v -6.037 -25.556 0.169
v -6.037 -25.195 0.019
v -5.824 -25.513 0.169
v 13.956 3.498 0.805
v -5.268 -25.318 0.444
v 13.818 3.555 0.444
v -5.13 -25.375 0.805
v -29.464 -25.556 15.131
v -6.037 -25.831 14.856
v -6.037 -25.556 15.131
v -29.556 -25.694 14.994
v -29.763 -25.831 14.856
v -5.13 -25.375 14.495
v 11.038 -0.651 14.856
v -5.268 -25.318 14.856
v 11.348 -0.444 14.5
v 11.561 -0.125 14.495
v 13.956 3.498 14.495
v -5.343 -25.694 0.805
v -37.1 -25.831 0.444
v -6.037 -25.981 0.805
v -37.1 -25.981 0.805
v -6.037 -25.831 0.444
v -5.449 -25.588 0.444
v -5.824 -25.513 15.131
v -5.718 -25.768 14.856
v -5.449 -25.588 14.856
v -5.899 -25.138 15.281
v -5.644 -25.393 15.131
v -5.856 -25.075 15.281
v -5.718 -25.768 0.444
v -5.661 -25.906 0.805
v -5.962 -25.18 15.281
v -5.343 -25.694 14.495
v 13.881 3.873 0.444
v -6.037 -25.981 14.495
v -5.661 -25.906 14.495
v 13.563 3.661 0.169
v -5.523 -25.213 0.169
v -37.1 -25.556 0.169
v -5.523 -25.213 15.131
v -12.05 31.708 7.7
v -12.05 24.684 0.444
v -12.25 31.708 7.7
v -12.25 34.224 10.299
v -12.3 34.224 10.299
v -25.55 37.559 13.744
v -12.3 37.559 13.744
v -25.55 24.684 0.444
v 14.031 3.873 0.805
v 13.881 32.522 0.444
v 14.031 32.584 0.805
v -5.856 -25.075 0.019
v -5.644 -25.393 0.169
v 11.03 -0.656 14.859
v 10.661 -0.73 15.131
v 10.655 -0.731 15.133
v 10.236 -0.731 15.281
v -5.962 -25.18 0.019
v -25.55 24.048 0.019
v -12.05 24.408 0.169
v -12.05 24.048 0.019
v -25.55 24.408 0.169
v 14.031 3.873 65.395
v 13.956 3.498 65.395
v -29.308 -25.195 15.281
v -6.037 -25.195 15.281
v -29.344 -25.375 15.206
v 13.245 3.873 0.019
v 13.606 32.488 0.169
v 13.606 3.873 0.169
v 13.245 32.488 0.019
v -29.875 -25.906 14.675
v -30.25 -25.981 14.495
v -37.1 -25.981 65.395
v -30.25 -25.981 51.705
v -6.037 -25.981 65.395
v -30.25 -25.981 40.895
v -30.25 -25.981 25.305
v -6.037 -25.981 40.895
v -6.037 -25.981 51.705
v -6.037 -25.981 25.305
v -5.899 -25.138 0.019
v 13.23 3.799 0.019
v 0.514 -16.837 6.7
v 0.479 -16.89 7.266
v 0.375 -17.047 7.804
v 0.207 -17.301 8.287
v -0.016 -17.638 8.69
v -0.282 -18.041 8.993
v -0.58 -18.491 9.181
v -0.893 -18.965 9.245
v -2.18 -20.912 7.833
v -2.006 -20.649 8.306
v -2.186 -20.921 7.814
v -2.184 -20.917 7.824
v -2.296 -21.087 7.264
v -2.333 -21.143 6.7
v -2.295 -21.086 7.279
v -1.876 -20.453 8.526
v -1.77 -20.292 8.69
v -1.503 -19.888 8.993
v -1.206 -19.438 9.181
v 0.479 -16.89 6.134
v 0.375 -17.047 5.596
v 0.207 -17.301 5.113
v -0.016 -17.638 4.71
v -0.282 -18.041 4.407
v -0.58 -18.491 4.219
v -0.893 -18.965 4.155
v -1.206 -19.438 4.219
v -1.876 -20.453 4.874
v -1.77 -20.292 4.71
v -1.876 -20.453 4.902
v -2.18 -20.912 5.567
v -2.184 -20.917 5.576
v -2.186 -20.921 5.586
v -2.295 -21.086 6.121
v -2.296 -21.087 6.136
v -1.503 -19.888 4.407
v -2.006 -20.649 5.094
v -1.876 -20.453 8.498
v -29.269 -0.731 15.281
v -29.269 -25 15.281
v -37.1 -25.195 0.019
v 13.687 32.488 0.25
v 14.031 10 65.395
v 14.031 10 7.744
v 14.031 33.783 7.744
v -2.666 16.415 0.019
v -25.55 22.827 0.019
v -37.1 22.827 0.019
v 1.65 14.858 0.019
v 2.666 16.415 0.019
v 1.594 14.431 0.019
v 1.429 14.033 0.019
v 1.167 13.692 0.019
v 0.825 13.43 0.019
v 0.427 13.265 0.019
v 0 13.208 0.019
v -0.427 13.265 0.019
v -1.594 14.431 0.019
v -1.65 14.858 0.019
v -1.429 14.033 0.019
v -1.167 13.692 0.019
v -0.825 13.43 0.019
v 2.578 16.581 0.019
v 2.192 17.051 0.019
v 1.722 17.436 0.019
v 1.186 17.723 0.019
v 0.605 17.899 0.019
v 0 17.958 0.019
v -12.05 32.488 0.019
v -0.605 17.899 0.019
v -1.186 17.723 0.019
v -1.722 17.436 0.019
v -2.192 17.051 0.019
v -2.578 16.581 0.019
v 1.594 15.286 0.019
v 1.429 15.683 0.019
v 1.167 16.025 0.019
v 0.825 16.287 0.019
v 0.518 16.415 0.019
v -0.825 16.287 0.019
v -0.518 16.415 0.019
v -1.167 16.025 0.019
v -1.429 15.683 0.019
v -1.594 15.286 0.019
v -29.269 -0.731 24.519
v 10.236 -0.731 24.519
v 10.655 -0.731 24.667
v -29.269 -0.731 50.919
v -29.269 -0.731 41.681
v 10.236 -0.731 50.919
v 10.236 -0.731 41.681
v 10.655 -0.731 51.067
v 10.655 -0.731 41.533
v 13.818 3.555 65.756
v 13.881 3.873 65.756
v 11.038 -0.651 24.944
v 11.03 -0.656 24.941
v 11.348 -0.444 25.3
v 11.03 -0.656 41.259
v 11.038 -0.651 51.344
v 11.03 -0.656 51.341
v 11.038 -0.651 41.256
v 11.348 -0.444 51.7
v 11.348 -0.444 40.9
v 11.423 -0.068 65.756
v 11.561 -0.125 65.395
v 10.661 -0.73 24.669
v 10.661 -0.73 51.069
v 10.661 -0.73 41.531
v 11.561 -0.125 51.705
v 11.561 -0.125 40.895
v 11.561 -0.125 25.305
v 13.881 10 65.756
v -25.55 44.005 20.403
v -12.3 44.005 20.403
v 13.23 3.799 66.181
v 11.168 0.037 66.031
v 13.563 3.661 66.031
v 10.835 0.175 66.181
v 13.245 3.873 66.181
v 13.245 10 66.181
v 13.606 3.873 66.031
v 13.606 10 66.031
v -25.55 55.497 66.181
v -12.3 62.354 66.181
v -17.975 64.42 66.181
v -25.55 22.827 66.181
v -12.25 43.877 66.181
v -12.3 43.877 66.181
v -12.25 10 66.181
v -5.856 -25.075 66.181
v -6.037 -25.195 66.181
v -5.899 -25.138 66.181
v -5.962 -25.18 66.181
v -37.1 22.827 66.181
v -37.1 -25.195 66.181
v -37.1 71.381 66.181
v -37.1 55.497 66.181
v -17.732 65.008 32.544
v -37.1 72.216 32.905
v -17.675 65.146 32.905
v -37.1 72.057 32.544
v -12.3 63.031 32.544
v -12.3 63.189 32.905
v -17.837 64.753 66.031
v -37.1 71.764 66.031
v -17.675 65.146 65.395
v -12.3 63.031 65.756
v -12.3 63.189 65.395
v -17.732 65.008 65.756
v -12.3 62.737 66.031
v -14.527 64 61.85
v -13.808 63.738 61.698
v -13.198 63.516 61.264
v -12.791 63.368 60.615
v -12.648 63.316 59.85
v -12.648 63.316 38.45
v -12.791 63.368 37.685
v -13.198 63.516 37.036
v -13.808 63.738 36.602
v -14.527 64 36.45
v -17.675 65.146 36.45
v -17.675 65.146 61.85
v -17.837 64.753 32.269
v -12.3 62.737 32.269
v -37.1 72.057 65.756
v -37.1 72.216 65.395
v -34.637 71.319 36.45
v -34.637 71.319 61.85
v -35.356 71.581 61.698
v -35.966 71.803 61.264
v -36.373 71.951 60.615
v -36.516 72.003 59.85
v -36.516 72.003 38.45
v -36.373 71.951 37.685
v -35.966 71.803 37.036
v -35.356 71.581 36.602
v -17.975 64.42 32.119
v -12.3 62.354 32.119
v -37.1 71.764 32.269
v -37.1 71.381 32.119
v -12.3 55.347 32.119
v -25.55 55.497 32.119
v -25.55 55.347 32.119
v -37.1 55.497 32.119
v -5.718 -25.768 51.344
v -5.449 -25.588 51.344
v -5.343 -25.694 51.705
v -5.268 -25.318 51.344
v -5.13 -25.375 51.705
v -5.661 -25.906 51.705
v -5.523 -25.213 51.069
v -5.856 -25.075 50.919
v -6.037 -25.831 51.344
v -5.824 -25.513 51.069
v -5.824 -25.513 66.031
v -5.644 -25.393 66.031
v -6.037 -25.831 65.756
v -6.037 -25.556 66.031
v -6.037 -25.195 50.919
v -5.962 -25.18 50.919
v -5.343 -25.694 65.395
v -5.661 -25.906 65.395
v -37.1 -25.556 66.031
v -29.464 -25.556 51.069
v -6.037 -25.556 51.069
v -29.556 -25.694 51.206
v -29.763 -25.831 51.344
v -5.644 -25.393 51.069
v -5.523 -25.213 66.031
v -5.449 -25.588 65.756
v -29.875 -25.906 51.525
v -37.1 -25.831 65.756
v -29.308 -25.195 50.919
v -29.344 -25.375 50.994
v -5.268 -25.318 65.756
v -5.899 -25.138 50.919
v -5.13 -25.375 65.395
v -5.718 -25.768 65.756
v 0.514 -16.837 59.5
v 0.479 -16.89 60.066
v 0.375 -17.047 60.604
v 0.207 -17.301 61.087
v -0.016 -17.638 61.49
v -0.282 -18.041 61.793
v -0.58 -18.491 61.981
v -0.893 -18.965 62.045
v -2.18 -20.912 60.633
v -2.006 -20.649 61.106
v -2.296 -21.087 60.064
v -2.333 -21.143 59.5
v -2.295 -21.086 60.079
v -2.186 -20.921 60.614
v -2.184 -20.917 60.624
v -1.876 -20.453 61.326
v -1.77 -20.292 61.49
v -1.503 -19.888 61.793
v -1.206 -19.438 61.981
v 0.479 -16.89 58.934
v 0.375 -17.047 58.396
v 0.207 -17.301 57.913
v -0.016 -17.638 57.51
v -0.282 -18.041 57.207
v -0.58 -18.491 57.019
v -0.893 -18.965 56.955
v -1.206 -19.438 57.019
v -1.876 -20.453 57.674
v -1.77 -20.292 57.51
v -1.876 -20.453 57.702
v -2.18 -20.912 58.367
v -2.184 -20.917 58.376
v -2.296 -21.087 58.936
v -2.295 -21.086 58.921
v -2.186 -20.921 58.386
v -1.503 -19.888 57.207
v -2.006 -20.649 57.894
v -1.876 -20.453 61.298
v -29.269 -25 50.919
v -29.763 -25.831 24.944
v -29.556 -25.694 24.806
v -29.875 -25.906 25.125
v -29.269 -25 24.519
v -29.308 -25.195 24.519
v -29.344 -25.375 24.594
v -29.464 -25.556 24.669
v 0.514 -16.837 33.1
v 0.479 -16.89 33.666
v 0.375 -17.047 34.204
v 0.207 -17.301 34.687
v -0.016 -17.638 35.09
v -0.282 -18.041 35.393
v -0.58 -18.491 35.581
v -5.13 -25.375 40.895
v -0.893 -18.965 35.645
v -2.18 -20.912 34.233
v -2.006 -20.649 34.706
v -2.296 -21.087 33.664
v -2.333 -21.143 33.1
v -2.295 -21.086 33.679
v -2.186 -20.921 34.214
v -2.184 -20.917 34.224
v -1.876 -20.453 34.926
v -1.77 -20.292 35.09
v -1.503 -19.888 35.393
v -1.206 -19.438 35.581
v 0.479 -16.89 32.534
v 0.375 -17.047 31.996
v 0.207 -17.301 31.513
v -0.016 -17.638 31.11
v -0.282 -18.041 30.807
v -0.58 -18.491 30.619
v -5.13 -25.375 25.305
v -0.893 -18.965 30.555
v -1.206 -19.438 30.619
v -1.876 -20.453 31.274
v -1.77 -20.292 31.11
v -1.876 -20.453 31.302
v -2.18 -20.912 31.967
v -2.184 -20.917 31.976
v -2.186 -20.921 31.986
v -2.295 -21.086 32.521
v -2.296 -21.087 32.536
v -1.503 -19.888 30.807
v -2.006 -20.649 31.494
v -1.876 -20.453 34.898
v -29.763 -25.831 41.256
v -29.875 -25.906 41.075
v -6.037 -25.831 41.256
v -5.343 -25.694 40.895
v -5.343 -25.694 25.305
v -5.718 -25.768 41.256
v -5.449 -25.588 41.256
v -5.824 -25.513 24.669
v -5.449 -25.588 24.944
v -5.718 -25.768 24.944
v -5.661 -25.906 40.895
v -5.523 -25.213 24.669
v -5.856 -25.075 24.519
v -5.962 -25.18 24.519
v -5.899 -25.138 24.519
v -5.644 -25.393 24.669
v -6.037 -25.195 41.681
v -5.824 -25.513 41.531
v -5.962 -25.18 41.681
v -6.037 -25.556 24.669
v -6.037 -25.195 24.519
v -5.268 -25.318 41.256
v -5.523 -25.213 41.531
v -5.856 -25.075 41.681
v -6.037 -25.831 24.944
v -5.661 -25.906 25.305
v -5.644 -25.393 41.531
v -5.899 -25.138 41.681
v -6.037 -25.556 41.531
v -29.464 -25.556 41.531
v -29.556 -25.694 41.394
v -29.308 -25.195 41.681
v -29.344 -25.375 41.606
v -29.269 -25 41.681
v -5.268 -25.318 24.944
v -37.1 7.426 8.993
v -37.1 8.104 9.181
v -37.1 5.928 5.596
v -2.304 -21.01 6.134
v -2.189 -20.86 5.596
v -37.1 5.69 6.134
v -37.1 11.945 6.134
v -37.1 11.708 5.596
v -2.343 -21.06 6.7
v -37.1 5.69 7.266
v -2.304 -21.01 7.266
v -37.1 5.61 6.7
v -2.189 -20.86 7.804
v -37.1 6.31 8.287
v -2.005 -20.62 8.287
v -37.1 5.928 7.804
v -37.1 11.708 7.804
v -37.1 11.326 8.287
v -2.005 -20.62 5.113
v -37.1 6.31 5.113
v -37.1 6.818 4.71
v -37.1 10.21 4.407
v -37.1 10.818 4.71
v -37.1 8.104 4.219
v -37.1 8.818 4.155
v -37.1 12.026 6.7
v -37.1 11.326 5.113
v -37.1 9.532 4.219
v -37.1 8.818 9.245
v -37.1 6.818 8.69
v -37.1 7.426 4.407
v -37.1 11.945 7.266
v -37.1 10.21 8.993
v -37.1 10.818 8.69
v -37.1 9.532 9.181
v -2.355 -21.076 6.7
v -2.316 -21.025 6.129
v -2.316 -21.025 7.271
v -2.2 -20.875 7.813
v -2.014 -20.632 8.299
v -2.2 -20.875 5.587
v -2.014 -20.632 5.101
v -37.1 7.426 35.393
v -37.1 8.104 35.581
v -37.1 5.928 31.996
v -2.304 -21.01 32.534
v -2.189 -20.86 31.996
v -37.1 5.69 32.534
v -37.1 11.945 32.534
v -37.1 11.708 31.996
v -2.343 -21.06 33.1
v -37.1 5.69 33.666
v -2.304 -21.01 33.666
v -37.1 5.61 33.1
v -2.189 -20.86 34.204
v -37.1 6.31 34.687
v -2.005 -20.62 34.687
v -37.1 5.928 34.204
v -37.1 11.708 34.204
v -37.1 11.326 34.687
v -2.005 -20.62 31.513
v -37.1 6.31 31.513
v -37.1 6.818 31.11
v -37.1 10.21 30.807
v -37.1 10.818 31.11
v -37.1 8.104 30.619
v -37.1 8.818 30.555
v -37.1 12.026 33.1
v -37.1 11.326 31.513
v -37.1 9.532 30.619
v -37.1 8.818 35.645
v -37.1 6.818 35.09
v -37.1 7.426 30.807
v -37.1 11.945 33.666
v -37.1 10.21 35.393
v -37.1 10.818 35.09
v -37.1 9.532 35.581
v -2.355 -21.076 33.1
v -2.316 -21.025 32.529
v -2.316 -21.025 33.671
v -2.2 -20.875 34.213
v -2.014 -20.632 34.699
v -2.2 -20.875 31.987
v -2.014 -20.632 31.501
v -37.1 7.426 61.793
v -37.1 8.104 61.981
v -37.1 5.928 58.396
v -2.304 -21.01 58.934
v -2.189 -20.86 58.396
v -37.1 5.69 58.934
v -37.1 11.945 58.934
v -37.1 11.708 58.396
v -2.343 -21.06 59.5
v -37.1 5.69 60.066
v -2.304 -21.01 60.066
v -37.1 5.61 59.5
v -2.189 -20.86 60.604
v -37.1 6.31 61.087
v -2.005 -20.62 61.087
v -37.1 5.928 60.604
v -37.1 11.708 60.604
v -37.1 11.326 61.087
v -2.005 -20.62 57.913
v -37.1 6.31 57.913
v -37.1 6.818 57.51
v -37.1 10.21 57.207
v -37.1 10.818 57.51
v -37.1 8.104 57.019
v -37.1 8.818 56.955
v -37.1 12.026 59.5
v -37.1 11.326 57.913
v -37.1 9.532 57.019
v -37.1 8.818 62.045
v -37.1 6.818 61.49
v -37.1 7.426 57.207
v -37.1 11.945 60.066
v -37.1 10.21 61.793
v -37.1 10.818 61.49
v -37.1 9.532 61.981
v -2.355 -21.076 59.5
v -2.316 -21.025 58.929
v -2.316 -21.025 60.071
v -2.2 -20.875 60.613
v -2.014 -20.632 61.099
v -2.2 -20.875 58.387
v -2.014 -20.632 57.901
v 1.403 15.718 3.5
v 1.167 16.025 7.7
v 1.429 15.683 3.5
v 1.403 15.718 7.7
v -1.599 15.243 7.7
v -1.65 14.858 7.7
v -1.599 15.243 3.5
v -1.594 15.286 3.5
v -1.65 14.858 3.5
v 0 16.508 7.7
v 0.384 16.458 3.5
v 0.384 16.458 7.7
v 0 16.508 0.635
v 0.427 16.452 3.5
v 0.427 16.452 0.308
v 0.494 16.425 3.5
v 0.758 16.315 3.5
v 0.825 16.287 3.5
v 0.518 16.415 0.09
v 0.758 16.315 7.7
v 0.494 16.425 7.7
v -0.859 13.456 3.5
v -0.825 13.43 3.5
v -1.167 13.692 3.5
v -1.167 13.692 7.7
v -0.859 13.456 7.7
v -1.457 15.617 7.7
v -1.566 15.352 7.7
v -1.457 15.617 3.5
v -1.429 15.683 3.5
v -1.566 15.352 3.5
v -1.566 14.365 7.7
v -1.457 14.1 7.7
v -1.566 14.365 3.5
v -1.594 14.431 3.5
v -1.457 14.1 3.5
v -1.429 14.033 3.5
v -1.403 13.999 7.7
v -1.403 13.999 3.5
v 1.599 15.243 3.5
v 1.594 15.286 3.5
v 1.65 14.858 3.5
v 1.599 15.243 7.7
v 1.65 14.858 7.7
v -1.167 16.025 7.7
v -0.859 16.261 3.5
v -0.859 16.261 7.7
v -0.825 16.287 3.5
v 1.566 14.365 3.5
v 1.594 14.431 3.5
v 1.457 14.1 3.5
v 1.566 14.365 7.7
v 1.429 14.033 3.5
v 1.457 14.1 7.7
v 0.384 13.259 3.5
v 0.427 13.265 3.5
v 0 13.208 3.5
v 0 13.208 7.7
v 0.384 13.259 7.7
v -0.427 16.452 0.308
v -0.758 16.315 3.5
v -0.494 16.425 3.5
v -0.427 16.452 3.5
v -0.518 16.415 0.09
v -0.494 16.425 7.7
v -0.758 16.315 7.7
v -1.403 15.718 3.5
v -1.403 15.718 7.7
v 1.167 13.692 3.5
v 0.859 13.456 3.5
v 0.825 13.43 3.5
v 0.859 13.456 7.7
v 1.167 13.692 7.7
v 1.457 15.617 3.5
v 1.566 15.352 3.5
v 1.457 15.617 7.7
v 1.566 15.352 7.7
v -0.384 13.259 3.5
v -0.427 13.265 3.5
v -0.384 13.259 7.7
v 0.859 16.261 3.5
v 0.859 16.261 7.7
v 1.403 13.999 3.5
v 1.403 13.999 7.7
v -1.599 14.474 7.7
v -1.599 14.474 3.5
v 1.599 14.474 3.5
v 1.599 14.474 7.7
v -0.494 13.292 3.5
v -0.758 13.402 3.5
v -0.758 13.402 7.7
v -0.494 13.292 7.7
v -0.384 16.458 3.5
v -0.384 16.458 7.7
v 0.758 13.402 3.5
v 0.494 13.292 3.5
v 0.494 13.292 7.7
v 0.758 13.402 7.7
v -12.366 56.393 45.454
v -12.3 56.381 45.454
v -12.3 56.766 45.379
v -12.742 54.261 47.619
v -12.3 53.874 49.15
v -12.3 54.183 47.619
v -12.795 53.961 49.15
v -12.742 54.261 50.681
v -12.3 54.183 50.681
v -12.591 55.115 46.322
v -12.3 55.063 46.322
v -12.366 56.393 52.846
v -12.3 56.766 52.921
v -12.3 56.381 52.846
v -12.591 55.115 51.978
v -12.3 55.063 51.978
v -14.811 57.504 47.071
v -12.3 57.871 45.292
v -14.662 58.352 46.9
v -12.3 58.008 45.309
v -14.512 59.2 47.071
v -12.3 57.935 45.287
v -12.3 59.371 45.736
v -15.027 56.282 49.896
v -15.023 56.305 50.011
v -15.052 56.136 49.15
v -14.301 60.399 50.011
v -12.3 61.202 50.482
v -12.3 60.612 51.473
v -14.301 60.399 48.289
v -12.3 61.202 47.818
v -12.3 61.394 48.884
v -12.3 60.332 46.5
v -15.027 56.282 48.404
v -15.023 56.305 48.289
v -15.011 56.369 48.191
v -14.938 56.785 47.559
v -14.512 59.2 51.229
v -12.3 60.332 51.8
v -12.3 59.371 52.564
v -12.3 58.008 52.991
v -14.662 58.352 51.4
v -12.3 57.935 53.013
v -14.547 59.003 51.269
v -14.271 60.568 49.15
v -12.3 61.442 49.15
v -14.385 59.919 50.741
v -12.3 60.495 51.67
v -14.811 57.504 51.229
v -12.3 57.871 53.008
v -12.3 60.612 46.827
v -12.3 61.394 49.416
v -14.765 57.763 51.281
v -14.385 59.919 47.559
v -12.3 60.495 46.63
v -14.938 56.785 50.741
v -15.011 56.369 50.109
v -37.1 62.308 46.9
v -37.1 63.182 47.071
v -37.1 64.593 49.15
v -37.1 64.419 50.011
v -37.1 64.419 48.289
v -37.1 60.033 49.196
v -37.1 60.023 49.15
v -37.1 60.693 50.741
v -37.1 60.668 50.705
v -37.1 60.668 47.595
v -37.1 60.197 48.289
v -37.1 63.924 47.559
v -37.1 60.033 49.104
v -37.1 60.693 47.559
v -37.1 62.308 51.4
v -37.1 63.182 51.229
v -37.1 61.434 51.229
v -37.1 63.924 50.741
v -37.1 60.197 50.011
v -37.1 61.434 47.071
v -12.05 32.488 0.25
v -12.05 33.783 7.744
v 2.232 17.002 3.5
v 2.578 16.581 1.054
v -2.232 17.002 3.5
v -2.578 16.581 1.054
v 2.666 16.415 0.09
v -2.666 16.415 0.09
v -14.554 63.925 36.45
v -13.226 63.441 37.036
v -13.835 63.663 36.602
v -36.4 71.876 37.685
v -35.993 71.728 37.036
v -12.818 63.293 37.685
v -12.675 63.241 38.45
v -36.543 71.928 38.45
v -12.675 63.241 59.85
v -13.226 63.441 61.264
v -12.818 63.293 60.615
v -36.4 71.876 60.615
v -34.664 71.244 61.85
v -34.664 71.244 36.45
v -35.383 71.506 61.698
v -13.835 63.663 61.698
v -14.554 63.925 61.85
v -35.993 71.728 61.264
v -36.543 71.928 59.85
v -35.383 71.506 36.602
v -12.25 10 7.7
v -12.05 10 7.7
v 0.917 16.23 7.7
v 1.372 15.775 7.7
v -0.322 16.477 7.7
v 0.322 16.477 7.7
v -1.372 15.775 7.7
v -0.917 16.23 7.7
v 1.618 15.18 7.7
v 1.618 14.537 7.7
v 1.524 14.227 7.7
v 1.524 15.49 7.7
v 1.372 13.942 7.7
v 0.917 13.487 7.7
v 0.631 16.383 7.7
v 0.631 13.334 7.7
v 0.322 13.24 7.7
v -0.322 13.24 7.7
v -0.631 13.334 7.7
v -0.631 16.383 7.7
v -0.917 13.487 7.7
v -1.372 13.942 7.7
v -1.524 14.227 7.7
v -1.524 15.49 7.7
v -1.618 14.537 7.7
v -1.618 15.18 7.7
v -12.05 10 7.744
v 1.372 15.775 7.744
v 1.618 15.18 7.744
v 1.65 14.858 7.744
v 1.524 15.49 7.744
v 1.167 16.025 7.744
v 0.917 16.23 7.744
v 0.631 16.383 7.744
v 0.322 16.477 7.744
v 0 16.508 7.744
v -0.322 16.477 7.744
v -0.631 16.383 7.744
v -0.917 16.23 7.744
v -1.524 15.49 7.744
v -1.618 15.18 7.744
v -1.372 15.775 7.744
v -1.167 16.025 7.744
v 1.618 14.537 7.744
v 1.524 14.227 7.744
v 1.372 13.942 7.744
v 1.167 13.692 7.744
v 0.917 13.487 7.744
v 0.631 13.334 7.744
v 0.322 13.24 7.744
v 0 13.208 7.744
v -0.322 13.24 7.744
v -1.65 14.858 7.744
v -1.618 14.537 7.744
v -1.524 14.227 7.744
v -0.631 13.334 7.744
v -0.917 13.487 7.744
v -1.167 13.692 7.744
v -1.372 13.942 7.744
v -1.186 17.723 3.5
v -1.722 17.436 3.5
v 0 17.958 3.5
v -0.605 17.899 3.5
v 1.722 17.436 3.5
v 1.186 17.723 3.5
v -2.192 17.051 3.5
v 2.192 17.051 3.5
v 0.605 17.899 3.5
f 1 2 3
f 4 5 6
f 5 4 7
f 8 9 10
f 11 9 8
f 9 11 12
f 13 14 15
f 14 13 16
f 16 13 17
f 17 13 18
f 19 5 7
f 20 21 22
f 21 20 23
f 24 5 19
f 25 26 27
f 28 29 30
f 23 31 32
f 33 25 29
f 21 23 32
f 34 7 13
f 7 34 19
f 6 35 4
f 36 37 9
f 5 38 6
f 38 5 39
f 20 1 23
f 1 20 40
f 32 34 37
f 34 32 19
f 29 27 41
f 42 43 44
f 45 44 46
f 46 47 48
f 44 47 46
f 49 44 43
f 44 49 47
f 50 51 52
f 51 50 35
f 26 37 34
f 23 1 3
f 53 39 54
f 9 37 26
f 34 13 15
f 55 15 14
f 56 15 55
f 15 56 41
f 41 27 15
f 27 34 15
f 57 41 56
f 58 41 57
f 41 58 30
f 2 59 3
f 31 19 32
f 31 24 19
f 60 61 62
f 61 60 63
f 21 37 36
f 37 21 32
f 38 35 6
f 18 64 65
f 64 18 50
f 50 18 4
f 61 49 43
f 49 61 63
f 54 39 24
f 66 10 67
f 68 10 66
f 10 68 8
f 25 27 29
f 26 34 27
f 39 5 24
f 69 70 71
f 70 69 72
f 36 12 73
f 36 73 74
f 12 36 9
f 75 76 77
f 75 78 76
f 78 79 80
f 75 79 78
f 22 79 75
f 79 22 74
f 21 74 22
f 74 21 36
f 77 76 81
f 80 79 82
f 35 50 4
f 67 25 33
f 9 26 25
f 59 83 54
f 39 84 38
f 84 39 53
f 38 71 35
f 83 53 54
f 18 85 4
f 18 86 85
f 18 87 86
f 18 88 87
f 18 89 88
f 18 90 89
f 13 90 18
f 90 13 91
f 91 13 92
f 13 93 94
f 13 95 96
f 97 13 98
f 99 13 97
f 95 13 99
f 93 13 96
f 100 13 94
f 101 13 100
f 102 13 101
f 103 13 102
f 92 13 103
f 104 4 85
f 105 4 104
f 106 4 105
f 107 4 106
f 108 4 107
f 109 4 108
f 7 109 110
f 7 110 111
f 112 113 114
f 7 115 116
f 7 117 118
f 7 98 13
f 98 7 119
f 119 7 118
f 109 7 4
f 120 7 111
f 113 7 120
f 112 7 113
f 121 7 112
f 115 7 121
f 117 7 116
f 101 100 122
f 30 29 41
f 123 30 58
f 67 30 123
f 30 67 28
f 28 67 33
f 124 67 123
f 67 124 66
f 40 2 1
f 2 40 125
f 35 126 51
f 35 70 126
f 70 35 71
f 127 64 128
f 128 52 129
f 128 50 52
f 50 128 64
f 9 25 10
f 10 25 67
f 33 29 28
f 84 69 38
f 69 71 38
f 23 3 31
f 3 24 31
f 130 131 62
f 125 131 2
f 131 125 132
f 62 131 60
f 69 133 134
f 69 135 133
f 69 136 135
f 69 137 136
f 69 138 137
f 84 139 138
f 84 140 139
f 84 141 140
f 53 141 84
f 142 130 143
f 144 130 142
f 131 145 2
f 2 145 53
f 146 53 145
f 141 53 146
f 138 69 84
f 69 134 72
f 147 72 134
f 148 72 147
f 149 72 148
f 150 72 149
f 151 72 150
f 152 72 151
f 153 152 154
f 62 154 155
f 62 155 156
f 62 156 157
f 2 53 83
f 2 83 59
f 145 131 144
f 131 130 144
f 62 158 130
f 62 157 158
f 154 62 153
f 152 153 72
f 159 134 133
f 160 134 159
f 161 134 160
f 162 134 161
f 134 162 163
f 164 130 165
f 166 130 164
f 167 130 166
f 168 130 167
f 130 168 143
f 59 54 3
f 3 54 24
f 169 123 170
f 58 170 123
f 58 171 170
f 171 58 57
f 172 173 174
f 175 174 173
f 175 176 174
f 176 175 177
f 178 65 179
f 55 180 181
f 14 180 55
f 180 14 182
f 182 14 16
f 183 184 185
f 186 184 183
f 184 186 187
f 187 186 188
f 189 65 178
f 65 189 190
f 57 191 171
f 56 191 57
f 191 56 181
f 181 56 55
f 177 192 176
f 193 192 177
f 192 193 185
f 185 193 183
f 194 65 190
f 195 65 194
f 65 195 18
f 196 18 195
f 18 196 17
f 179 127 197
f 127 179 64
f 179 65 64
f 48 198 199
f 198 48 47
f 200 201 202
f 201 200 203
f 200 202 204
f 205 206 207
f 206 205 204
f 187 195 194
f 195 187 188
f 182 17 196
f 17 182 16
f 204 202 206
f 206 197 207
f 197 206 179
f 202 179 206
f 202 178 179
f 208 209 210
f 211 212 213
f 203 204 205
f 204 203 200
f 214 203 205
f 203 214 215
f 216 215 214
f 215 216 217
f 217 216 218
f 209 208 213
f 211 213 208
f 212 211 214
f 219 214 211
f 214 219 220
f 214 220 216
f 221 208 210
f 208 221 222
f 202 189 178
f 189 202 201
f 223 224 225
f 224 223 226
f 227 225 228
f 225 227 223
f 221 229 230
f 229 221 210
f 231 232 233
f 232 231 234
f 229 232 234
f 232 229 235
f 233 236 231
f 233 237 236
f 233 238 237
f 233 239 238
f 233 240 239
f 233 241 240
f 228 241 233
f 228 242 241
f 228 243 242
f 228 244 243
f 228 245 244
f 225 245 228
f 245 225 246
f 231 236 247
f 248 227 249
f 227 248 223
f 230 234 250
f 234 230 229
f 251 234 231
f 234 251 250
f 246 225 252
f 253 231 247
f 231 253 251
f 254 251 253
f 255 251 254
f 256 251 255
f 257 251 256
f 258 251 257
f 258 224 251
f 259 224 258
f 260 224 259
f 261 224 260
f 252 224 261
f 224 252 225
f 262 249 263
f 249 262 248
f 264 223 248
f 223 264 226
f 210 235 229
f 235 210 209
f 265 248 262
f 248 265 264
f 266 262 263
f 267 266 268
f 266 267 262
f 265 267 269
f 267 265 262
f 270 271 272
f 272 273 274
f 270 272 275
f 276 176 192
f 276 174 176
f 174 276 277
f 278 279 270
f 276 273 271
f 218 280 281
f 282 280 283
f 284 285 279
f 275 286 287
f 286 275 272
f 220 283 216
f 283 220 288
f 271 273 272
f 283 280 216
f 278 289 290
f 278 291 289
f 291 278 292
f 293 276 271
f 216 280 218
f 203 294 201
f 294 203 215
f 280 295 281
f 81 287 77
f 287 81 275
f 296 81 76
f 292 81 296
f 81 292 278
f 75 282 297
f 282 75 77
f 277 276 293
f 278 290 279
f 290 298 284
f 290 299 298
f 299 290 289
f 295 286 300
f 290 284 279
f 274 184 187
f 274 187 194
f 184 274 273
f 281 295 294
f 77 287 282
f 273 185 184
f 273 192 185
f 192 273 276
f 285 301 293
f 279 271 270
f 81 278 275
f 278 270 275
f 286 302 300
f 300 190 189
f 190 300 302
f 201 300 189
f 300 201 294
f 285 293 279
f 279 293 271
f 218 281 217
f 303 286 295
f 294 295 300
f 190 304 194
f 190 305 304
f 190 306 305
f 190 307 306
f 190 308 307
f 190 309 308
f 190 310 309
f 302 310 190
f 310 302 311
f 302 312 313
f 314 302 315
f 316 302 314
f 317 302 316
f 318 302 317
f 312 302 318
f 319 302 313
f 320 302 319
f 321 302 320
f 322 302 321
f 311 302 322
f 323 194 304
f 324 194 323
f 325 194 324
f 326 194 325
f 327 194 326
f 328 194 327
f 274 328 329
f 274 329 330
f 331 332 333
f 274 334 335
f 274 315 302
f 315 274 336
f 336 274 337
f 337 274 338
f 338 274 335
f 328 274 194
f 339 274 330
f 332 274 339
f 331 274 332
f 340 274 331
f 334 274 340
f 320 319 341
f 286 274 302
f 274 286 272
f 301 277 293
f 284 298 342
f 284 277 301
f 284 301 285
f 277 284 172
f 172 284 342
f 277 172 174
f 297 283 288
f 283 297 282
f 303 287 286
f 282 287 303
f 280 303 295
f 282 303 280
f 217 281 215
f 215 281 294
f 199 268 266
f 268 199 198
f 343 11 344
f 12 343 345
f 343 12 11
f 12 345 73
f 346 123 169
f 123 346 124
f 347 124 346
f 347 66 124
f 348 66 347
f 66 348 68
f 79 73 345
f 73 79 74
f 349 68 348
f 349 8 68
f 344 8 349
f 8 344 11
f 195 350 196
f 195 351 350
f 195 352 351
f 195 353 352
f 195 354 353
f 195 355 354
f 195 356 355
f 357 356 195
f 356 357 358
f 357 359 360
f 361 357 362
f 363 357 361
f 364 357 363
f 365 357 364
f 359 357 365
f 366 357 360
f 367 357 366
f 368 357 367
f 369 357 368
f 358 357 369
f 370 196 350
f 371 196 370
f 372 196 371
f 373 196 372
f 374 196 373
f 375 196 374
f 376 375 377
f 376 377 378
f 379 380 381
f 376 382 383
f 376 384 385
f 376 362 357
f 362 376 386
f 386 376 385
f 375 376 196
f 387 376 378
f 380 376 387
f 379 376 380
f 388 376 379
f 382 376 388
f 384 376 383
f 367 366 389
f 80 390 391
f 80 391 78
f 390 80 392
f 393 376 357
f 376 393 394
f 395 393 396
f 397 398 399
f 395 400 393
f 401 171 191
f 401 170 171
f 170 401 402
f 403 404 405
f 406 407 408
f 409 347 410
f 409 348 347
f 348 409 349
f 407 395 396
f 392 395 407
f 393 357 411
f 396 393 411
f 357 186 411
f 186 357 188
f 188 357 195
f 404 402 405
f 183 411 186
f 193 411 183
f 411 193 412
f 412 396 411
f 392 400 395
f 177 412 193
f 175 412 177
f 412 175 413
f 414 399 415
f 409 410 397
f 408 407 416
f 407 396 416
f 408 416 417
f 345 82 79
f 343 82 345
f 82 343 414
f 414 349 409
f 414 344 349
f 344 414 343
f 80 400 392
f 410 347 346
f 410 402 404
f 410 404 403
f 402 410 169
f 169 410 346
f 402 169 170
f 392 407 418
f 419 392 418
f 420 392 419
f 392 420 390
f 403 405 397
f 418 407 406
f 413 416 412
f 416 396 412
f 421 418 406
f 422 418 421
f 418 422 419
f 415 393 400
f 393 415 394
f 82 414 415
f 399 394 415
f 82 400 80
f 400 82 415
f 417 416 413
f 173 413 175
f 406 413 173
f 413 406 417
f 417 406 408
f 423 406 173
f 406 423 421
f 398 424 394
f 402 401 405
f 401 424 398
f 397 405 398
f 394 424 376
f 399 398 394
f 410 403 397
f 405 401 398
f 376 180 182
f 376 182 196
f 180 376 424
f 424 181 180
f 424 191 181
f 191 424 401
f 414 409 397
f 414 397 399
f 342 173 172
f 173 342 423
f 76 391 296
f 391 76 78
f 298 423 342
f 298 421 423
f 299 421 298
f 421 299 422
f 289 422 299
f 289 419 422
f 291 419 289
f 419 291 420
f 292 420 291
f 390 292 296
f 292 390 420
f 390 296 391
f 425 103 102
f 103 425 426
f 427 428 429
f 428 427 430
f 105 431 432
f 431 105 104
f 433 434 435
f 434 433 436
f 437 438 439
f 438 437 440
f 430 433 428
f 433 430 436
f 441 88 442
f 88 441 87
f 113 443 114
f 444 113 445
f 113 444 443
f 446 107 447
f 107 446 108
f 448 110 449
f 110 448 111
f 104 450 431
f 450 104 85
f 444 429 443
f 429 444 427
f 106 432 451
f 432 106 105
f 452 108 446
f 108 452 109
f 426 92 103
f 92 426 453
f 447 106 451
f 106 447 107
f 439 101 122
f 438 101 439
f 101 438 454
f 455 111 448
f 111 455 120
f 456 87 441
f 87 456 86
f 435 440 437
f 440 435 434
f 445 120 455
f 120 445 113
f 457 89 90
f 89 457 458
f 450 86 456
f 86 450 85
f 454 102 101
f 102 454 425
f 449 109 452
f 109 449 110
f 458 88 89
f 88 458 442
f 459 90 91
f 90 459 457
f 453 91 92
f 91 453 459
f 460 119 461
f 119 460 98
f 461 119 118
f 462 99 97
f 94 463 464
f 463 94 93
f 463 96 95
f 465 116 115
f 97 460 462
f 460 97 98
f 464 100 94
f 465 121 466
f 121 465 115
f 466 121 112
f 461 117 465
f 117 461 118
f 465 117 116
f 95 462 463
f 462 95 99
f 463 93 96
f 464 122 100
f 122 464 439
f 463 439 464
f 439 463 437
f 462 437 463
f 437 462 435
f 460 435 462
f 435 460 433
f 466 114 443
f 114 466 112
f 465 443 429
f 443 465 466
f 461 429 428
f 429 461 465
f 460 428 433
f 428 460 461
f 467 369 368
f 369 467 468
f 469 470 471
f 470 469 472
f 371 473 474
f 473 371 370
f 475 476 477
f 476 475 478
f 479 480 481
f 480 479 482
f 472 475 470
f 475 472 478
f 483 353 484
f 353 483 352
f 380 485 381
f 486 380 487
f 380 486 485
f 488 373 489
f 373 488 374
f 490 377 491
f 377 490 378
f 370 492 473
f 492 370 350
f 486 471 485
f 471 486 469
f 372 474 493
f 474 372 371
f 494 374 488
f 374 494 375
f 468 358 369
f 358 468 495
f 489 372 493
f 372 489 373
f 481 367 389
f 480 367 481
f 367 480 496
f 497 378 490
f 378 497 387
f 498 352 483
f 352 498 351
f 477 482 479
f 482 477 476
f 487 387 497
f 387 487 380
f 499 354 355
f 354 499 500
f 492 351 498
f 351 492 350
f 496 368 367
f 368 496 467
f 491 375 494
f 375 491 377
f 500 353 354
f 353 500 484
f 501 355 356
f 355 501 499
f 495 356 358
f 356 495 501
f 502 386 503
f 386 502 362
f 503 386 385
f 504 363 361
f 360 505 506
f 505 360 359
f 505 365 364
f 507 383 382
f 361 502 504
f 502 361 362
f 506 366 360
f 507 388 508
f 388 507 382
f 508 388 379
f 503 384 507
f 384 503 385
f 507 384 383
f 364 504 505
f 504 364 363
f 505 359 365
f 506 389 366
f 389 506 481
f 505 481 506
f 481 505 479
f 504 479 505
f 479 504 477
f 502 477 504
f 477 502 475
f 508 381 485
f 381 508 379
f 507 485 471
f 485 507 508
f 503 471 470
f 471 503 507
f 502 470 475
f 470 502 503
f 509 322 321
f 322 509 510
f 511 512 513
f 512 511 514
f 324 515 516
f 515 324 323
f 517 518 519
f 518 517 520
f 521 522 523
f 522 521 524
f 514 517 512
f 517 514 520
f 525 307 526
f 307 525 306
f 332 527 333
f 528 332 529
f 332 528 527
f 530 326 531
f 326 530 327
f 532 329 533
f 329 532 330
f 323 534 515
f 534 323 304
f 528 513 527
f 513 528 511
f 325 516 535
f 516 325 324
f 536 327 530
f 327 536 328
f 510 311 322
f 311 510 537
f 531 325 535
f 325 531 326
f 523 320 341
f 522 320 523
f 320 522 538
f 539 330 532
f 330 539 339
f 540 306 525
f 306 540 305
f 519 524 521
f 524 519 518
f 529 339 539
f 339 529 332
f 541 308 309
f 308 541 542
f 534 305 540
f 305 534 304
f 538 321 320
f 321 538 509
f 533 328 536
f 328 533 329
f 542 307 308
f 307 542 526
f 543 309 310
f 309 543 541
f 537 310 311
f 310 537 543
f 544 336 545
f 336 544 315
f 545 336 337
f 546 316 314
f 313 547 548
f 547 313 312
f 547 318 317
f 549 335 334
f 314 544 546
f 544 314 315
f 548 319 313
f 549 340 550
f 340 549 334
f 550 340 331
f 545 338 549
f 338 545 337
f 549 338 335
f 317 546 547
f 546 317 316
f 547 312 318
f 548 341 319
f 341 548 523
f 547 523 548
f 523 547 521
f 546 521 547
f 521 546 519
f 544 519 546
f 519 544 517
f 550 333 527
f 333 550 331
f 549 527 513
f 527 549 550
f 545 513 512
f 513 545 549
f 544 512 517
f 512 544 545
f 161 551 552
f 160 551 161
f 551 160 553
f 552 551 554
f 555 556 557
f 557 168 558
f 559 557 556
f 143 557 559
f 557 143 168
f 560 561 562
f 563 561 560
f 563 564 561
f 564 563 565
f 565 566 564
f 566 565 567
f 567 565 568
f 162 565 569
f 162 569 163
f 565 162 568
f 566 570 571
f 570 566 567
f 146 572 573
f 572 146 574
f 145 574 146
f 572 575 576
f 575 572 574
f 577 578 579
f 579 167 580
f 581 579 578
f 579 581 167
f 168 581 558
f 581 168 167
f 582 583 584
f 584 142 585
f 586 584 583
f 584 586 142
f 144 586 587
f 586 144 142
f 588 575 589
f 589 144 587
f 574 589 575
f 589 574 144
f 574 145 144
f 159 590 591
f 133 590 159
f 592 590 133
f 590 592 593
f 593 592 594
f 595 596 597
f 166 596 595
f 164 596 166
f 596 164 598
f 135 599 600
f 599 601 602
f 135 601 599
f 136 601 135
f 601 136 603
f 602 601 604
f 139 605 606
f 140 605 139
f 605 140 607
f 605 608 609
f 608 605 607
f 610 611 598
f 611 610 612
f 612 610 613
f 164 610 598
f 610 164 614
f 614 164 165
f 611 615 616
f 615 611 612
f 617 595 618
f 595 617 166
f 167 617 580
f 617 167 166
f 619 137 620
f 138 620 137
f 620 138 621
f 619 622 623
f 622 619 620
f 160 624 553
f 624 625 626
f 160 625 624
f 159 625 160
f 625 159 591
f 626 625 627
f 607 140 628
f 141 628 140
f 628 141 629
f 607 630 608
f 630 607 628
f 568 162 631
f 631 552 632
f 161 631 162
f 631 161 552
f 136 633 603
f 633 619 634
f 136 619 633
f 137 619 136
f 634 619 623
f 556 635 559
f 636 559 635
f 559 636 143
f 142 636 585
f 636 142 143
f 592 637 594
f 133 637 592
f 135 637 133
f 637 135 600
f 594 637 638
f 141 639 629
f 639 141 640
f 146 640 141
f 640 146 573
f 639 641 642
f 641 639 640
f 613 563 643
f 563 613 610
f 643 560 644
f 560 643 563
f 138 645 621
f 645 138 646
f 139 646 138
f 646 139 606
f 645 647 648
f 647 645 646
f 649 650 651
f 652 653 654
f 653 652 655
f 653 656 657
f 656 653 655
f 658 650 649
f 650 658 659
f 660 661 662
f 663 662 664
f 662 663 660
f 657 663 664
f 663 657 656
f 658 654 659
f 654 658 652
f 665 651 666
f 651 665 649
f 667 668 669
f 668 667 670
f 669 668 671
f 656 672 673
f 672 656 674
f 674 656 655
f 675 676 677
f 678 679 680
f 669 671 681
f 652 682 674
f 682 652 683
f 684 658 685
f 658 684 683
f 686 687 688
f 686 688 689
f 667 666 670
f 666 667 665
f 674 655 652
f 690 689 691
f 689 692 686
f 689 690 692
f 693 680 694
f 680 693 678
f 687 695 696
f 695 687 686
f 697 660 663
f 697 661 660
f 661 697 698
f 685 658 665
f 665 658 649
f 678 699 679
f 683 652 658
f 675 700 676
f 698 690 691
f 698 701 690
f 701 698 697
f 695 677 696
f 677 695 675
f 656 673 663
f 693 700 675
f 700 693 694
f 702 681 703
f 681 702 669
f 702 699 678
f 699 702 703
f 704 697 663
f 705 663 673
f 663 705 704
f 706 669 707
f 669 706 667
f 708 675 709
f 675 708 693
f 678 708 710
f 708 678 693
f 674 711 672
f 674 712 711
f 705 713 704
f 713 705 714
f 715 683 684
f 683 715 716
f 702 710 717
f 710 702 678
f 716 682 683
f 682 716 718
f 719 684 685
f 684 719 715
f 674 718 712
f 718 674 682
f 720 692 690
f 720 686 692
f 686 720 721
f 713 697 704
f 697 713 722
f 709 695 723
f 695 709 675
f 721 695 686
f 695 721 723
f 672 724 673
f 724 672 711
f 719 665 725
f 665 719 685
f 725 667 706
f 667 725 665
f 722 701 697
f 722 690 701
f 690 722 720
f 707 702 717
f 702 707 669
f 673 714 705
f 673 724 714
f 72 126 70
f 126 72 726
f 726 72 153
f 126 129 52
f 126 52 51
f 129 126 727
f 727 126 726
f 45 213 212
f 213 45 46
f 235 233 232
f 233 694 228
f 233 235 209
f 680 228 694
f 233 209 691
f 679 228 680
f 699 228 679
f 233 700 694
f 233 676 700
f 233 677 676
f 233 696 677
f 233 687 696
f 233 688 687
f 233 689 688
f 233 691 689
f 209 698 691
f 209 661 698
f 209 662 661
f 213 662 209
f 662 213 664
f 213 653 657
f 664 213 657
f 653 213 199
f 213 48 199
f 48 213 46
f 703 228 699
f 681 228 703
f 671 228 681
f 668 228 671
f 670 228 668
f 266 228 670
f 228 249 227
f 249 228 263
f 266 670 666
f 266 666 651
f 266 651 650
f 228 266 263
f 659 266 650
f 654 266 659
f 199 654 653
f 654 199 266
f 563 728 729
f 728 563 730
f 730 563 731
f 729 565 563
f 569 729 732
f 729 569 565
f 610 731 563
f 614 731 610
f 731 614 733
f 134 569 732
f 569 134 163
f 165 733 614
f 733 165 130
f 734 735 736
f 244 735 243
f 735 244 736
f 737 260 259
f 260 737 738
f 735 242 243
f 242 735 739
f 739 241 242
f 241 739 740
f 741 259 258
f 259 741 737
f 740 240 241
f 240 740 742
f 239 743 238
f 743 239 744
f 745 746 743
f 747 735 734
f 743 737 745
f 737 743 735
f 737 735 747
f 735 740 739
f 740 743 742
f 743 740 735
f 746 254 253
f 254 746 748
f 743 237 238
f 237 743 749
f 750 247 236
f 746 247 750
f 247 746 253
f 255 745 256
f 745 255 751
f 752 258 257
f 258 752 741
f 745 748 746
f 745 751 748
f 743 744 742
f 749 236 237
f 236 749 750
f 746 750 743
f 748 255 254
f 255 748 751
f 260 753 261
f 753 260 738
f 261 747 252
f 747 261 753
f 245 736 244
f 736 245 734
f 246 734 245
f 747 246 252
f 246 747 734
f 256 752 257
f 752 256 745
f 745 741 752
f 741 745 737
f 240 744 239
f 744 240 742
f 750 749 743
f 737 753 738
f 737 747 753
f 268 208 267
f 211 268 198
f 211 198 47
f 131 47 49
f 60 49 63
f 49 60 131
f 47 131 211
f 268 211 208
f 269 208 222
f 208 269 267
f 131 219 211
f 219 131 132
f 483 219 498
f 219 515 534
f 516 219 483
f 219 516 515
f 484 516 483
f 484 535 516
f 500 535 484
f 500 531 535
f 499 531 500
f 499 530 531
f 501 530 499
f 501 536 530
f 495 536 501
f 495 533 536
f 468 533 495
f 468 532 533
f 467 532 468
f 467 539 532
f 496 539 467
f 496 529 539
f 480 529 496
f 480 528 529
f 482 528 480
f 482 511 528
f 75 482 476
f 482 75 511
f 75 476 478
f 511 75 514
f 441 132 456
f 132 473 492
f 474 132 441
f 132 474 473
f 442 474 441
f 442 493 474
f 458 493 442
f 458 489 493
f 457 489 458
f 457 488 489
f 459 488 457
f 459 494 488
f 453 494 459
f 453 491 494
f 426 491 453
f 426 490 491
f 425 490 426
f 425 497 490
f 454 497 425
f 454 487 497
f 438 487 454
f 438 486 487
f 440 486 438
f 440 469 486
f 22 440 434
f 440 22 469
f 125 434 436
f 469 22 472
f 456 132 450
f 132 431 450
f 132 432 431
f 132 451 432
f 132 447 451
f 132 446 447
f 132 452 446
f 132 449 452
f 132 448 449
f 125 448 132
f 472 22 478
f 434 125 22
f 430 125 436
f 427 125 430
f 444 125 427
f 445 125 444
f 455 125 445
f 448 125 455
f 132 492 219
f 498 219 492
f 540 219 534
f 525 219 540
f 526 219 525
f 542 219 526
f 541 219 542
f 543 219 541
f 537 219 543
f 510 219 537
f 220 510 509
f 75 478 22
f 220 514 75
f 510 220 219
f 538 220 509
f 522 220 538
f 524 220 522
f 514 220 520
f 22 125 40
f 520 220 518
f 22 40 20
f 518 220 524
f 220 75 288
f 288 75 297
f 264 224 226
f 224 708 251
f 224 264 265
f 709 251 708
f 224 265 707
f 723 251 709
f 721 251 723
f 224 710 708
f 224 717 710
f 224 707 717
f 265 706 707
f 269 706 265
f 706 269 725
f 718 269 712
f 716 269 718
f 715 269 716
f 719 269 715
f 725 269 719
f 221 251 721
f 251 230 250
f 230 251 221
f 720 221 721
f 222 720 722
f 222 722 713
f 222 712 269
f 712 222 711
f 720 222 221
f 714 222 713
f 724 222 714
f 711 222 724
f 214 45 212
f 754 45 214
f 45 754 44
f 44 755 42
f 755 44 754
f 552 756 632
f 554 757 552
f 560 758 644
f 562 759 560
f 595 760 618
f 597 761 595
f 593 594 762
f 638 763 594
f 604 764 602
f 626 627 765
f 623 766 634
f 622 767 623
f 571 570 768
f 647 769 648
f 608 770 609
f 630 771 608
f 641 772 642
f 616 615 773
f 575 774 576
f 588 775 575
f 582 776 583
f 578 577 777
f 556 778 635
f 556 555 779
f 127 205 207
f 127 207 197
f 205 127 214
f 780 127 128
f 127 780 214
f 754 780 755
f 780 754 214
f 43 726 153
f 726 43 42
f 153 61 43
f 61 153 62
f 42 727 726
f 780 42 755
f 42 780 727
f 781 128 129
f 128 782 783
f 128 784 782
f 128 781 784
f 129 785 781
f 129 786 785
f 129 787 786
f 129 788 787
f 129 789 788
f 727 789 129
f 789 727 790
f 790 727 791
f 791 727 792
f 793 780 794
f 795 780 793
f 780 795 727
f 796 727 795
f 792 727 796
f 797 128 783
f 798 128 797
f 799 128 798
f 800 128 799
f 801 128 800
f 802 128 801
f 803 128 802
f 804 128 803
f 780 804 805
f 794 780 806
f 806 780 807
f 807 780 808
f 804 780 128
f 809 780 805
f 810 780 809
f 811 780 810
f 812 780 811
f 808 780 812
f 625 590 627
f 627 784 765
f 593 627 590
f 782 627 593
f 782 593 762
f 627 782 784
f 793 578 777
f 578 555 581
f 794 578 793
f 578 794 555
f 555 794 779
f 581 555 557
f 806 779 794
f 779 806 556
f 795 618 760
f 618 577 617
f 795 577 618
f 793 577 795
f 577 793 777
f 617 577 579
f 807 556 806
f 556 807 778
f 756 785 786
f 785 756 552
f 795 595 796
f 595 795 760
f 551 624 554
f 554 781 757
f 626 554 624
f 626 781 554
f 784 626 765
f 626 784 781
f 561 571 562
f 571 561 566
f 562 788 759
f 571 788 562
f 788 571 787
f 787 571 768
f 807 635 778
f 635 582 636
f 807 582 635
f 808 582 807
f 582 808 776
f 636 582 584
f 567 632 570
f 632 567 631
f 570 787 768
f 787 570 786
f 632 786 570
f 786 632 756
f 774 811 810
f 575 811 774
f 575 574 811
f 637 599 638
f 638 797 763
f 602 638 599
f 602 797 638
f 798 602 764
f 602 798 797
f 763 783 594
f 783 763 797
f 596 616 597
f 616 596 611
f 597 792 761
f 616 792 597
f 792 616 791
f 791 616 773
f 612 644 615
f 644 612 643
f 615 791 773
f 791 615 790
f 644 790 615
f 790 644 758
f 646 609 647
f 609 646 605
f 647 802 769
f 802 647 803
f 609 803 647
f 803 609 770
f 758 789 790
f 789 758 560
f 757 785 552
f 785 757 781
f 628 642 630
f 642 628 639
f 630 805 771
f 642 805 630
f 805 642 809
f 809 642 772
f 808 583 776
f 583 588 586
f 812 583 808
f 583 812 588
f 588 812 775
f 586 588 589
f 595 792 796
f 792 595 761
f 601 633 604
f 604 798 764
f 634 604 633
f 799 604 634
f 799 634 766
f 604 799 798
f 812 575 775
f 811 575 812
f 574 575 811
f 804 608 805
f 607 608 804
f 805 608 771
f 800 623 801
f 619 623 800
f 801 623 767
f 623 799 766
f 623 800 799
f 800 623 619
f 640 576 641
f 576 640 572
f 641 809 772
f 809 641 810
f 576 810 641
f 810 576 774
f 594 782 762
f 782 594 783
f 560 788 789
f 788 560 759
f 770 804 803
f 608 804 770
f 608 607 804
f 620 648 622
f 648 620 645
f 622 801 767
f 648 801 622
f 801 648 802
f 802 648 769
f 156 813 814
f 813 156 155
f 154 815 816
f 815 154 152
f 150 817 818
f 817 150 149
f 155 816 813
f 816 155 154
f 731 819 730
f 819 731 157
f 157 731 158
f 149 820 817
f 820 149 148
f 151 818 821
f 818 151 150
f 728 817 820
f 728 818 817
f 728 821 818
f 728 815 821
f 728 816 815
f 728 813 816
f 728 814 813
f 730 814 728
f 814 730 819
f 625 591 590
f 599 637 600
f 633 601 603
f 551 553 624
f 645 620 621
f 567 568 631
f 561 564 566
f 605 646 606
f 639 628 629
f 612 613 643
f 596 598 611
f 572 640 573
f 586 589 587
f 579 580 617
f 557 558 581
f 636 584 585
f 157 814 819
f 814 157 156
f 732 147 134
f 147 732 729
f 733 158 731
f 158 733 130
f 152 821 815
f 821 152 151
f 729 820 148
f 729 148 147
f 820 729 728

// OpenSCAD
// Right bumper bracket — mirror image of bumper-bracket.scad (the left bracket).
//
// The default body in bumper-bracket.scad is the LEFT bracket: it mounts on the
// RIGHT side of a pew leg. This file is its mirror twin, the RIGHT bracket, which
// mounts on the LEFT side of a pew leg.
//
// Handedness lives on the bracket X axis (the QR/kneeler ↔ wedge width): the
// sloped roof, the +X pew-mount block, and the angled #8 wood-screw bores are all
// laterally offset toward the +X (leg-contact, face A) side. Reflecting across X
// (mirror([1, 0, 0])) moves that whole leg-mount hand to the opposite side while
// leaving the pew-engagement face (+Z, C) and tread-slot mouth (−Z, D) pointing
// the same way — exactly the difference between the two sides of a leg.
//
// The tread slot/pockets, the wood-screw spacing, the M3 hardware, and the
// retention cap are all reused as-is. The cap is very slightly X-asymmetric (the
// wedge/mount-block bias the rounding by ~0.7 x 0.5 mm at one -Z mouth corner),
// but an interference check shows the left cap drops into the mirrored recess with
// zero clash — the difference is only a sub-mm cosmetic gap at that corner, so the
// same cap.scad serves both hands.
//
// Export note: bumper_bracket() already applies bracket_export_bed_lift() (a Z-only
// translate), and mirror([1, 0, 0]) commutes with it, so min-Z still rests on the
// build plate.

BUMPER_BRACKET_INCLUDED_BY = true;
include <bumper-bracket.scad>

mirror([1, 0, 0])
    bumper_bracket();
